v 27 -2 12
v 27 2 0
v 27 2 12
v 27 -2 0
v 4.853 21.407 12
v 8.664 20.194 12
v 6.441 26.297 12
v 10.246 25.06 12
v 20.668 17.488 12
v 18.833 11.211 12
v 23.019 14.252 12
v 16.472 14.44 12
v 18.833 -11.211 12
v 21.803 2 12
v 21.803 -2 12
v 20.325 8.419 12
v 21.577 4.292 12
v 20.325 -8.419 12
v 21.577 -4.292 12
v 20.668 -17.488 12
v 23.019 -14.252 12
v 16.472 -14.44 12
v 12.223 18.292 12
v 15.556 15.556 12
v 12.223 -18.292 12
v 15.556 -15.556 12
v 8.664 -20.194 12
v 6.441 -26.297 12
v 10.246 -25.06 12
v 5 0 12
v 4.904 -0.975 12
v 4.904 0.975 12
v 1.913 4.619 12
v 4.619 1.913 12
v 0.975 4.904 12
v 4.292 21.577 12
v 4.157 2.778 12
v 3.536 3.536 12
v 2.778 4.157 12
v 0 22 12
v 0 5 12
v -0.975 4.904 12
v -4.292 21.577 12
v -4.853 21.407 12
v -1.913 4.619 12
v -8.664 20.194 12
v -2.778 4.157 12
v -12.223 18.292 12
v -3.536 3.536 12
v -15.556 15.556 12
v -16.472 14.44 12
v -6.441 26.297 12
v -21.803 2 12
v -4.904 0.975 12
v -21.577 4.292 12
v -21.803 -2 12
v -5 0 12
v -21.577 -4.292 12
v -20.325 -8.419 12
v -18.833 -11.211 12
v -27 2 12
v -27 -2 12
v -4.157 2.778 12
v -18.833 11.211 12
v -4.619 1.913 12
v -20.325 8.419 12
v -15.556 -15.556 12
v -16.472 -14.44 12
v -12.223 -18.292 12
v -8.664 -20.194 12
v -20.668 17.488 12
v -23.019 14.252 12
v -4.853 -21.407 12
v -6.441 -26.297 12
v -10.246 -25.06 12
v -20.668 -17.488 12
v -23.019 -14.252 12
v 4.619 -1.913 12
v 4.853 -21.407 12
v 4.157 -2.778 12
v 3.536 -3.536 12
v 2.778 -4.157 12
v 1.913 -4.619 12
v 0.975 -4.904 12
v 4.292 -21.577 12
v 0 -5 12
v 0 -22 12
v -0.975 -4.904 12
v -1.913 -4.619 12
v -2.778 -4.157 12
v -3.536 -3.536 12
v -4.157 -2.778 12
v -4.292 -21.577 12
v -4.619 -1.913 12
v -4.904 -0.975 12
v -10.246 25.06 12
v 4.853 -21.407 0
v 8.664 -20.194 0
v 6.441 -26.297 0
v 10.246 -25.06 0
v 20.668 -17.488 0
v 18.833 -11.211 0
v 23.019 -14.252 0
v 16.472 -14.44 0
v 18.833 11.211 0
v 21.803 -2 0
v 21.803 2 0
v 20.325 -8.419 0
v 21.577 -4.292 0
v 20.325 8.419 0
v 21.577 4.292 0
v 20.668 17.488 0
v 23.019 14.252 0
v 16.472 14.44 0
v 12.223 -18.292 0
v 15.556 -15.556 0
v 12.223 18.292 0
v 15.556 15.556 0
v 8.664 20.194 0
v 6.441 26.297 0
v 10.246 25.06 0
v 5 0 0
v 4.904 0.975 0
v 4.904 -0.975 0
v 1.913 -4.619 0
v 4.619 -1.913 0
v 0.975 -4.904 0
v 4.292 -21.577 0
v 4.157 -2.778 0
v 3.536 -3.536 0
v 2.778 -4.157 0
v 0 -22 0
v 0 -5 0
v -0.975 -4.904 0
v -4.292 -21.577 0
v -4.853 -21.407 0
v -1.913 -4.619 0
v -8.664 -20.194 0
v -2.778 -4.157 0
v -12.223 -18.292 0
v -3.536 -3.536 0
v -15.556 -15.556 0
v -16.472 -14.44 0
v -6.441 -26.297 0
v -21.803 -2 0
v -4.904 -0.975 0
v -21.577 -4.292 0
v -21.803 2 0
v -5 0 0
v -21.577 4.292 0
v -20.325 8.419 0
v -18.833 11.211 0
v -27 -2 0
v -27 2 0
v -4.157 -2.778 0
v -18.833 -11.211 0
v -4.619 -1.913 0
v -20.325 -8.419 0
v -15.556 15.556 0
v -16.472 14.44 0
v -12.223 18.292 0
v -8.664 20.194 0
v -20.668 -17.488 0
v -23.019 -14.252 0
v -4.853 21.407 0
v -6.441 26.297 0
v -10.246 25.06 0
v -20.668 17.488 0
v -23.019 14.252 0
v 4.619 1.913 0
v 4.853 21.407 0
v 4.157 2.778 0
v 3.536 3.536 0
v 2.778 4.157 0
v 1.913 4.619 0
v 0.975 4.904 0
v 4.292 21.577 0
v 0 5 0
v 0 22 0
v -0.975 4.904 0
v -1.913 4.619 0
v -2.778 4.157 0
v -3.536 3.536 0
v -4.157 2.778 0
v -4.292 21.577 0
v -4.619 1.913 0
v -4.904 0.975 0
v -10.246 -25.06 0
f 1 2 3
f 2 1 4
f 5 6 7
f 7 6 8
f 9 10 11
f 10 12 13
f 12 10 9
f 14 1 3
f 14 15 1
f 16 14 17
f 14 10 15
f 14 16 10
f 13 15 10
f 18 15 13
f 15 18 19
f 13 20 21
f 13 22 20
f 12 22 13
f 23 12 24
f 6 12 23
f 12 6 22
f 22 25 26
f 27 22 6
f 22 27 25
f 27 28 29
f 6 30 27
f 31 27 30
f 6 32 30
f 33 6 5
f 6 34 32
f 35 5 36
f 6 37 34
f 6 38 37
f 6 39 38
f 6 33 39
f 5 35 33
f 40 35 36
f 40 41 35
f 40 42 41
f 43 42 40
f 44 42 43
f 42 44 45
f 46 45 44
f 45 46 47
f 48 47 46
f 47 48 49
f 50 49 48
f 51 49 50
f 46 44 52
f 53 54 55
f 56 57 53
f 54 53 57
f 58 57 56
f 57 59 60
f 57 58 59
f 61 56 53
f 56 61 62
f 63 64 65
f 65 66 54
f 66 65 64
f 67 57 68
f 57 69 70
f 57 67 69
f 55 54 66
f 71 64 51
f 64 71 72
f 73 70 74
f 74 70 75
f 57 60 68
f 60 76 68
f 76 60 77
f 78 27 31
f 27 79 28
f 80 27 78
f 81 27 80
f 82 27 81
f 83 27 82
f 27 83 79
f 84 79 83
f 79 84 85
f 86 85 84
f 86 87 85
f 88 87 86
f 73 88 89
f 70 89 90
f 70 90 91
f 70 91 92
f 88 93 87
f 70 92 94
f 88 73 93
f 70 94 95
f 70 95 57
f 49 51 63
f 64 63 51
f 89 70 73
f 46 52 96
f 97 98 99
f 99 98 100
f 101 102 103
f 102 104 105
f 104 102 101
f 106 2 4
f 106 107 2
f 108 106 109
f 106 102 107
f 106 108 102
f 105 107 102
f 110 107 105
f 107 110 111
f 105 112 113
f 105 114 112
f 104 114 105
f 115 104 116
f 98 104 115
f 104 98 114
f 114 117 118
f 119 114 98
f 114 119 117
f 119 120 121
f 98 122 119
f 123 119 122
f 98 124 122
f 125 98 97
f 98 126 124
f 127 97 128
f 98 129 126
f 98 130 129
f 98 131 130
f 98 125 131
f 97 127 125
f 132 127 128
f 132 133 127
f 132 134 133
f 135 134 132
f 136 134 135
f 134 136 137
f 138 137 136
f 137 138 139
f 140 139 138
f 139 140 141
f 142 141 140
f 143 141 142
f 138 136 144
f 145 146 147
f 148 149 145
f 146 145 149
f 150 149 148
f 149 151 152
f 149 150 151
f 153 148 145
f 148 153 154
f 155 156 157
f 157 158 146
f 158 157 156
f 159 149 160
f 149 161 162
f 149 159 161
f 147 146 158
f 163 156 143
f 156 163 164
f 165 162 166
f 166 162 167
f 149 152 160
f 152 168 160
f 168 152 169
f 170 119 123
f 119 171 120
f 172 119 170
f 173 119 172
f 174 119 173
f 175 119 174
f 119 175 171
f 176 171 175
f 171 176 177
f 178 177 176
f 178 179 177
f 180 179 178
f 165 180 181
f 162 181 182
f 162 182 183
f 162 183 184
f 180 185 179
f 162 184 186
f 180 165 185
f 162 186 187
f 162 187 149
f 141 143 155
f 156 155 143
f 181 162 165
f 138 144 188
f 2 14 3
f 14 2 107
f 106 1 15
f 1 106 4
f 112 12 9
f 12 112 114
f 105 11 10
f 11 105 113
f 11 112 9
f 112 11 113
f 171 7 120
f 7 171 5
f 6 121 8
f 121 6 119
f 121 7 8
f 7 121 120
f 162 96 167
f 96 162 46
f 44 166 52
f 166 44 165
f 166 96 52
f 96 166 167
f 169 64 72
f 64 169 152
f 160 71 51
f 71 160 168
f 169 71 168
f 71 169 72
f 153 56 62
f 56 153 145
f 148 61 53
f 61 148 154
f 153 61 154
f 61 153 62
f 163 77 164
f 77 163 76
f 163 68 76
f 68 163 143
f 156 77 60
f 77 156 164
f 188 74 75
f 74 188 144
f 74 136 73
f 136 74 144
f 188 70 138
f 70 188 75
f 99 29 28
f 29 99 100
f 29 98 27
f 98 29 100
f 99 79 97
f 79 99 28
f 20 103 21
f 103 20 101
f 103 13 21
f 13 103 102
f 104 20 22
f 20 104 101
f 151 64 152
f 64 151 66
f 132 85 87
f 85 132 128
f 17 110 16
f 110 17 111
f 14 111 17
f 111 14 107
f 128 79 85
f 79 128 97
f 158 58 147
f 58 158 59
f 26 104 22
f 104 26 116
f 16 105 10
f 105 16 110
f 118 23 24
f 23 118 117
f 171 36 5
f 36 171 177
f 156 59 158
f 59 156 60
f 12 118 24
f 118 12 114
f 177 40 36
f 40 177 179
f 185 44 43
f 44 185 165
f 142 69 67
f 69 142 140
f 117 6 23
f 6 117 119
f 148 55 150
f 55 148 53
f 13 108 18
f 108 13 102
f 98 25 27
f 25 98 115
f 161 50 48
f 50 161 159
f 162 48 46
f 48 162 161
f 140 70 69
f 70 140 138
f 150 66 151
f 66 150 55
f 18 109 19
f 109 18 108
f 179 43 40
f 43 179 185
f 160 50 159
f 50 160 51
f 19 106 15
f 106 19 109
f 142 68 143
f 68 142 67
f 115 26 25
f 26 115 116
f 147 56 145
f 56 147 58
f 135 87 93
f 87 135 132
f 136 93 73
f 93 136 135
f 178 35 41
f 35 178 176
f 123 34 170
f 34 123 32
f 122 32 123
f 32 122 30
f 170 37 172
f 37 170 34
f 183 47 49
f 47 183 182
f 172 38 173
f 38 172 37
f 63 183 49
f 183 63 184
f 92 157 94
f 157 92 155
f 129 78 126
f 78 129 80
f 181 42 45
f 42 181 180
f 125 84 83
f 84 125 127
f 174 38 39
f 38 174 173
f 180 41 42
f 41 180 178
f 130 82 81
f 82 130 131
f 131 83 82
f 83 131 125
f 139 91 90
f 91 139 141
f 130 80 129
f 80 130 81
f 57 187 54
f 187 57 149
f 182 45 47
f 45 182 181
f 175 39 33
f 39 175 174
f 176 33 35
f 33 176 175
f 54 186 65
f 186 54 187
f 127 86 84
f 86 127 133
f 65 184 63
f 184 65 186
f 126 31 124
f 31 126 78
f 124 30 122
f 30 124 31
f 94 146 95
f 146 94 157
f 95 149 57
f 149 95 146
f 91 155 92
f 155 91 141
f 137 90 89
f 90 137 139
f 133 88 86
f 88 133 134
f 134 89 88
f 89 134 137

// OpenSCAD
$fn = 32;

// ----------------------------------------------------------------------
// Spur blank: bored gear blank
// ----------------------------------------------------------------------

// --- parameters (mm) ---
disc_r = 22;              // blank root radius
disc_t = 12;              // blank thickness
n_teeth = 10;             // stub tooth count
tooth_w = 4;              // tooth width at the root
tooth_h = 5;              // tooth height above the root
bore_r = 5;               // central bore radius

out_r = disc_r + tooth_h;  // tip radius
bbox_x = 54.0;  // measured width over the teeth
bbox_y = 52.59;  // measured depth over the teeth

difference() {
union() {
  cylinder(r = disc_r, h = disc_t);
  for (i = [0 : n_teeth - 1])
    rotate([0, 0, i * 360 / n_teeth])
      translate([disc_r - 1, -tooth_w / 2, 0])
        cube([tooth_h + 1, tooth_w, disc_t]);
}
  translate([0, 0, -1]) cylinder(r = bore_r, h = disc_t + 2);
}
